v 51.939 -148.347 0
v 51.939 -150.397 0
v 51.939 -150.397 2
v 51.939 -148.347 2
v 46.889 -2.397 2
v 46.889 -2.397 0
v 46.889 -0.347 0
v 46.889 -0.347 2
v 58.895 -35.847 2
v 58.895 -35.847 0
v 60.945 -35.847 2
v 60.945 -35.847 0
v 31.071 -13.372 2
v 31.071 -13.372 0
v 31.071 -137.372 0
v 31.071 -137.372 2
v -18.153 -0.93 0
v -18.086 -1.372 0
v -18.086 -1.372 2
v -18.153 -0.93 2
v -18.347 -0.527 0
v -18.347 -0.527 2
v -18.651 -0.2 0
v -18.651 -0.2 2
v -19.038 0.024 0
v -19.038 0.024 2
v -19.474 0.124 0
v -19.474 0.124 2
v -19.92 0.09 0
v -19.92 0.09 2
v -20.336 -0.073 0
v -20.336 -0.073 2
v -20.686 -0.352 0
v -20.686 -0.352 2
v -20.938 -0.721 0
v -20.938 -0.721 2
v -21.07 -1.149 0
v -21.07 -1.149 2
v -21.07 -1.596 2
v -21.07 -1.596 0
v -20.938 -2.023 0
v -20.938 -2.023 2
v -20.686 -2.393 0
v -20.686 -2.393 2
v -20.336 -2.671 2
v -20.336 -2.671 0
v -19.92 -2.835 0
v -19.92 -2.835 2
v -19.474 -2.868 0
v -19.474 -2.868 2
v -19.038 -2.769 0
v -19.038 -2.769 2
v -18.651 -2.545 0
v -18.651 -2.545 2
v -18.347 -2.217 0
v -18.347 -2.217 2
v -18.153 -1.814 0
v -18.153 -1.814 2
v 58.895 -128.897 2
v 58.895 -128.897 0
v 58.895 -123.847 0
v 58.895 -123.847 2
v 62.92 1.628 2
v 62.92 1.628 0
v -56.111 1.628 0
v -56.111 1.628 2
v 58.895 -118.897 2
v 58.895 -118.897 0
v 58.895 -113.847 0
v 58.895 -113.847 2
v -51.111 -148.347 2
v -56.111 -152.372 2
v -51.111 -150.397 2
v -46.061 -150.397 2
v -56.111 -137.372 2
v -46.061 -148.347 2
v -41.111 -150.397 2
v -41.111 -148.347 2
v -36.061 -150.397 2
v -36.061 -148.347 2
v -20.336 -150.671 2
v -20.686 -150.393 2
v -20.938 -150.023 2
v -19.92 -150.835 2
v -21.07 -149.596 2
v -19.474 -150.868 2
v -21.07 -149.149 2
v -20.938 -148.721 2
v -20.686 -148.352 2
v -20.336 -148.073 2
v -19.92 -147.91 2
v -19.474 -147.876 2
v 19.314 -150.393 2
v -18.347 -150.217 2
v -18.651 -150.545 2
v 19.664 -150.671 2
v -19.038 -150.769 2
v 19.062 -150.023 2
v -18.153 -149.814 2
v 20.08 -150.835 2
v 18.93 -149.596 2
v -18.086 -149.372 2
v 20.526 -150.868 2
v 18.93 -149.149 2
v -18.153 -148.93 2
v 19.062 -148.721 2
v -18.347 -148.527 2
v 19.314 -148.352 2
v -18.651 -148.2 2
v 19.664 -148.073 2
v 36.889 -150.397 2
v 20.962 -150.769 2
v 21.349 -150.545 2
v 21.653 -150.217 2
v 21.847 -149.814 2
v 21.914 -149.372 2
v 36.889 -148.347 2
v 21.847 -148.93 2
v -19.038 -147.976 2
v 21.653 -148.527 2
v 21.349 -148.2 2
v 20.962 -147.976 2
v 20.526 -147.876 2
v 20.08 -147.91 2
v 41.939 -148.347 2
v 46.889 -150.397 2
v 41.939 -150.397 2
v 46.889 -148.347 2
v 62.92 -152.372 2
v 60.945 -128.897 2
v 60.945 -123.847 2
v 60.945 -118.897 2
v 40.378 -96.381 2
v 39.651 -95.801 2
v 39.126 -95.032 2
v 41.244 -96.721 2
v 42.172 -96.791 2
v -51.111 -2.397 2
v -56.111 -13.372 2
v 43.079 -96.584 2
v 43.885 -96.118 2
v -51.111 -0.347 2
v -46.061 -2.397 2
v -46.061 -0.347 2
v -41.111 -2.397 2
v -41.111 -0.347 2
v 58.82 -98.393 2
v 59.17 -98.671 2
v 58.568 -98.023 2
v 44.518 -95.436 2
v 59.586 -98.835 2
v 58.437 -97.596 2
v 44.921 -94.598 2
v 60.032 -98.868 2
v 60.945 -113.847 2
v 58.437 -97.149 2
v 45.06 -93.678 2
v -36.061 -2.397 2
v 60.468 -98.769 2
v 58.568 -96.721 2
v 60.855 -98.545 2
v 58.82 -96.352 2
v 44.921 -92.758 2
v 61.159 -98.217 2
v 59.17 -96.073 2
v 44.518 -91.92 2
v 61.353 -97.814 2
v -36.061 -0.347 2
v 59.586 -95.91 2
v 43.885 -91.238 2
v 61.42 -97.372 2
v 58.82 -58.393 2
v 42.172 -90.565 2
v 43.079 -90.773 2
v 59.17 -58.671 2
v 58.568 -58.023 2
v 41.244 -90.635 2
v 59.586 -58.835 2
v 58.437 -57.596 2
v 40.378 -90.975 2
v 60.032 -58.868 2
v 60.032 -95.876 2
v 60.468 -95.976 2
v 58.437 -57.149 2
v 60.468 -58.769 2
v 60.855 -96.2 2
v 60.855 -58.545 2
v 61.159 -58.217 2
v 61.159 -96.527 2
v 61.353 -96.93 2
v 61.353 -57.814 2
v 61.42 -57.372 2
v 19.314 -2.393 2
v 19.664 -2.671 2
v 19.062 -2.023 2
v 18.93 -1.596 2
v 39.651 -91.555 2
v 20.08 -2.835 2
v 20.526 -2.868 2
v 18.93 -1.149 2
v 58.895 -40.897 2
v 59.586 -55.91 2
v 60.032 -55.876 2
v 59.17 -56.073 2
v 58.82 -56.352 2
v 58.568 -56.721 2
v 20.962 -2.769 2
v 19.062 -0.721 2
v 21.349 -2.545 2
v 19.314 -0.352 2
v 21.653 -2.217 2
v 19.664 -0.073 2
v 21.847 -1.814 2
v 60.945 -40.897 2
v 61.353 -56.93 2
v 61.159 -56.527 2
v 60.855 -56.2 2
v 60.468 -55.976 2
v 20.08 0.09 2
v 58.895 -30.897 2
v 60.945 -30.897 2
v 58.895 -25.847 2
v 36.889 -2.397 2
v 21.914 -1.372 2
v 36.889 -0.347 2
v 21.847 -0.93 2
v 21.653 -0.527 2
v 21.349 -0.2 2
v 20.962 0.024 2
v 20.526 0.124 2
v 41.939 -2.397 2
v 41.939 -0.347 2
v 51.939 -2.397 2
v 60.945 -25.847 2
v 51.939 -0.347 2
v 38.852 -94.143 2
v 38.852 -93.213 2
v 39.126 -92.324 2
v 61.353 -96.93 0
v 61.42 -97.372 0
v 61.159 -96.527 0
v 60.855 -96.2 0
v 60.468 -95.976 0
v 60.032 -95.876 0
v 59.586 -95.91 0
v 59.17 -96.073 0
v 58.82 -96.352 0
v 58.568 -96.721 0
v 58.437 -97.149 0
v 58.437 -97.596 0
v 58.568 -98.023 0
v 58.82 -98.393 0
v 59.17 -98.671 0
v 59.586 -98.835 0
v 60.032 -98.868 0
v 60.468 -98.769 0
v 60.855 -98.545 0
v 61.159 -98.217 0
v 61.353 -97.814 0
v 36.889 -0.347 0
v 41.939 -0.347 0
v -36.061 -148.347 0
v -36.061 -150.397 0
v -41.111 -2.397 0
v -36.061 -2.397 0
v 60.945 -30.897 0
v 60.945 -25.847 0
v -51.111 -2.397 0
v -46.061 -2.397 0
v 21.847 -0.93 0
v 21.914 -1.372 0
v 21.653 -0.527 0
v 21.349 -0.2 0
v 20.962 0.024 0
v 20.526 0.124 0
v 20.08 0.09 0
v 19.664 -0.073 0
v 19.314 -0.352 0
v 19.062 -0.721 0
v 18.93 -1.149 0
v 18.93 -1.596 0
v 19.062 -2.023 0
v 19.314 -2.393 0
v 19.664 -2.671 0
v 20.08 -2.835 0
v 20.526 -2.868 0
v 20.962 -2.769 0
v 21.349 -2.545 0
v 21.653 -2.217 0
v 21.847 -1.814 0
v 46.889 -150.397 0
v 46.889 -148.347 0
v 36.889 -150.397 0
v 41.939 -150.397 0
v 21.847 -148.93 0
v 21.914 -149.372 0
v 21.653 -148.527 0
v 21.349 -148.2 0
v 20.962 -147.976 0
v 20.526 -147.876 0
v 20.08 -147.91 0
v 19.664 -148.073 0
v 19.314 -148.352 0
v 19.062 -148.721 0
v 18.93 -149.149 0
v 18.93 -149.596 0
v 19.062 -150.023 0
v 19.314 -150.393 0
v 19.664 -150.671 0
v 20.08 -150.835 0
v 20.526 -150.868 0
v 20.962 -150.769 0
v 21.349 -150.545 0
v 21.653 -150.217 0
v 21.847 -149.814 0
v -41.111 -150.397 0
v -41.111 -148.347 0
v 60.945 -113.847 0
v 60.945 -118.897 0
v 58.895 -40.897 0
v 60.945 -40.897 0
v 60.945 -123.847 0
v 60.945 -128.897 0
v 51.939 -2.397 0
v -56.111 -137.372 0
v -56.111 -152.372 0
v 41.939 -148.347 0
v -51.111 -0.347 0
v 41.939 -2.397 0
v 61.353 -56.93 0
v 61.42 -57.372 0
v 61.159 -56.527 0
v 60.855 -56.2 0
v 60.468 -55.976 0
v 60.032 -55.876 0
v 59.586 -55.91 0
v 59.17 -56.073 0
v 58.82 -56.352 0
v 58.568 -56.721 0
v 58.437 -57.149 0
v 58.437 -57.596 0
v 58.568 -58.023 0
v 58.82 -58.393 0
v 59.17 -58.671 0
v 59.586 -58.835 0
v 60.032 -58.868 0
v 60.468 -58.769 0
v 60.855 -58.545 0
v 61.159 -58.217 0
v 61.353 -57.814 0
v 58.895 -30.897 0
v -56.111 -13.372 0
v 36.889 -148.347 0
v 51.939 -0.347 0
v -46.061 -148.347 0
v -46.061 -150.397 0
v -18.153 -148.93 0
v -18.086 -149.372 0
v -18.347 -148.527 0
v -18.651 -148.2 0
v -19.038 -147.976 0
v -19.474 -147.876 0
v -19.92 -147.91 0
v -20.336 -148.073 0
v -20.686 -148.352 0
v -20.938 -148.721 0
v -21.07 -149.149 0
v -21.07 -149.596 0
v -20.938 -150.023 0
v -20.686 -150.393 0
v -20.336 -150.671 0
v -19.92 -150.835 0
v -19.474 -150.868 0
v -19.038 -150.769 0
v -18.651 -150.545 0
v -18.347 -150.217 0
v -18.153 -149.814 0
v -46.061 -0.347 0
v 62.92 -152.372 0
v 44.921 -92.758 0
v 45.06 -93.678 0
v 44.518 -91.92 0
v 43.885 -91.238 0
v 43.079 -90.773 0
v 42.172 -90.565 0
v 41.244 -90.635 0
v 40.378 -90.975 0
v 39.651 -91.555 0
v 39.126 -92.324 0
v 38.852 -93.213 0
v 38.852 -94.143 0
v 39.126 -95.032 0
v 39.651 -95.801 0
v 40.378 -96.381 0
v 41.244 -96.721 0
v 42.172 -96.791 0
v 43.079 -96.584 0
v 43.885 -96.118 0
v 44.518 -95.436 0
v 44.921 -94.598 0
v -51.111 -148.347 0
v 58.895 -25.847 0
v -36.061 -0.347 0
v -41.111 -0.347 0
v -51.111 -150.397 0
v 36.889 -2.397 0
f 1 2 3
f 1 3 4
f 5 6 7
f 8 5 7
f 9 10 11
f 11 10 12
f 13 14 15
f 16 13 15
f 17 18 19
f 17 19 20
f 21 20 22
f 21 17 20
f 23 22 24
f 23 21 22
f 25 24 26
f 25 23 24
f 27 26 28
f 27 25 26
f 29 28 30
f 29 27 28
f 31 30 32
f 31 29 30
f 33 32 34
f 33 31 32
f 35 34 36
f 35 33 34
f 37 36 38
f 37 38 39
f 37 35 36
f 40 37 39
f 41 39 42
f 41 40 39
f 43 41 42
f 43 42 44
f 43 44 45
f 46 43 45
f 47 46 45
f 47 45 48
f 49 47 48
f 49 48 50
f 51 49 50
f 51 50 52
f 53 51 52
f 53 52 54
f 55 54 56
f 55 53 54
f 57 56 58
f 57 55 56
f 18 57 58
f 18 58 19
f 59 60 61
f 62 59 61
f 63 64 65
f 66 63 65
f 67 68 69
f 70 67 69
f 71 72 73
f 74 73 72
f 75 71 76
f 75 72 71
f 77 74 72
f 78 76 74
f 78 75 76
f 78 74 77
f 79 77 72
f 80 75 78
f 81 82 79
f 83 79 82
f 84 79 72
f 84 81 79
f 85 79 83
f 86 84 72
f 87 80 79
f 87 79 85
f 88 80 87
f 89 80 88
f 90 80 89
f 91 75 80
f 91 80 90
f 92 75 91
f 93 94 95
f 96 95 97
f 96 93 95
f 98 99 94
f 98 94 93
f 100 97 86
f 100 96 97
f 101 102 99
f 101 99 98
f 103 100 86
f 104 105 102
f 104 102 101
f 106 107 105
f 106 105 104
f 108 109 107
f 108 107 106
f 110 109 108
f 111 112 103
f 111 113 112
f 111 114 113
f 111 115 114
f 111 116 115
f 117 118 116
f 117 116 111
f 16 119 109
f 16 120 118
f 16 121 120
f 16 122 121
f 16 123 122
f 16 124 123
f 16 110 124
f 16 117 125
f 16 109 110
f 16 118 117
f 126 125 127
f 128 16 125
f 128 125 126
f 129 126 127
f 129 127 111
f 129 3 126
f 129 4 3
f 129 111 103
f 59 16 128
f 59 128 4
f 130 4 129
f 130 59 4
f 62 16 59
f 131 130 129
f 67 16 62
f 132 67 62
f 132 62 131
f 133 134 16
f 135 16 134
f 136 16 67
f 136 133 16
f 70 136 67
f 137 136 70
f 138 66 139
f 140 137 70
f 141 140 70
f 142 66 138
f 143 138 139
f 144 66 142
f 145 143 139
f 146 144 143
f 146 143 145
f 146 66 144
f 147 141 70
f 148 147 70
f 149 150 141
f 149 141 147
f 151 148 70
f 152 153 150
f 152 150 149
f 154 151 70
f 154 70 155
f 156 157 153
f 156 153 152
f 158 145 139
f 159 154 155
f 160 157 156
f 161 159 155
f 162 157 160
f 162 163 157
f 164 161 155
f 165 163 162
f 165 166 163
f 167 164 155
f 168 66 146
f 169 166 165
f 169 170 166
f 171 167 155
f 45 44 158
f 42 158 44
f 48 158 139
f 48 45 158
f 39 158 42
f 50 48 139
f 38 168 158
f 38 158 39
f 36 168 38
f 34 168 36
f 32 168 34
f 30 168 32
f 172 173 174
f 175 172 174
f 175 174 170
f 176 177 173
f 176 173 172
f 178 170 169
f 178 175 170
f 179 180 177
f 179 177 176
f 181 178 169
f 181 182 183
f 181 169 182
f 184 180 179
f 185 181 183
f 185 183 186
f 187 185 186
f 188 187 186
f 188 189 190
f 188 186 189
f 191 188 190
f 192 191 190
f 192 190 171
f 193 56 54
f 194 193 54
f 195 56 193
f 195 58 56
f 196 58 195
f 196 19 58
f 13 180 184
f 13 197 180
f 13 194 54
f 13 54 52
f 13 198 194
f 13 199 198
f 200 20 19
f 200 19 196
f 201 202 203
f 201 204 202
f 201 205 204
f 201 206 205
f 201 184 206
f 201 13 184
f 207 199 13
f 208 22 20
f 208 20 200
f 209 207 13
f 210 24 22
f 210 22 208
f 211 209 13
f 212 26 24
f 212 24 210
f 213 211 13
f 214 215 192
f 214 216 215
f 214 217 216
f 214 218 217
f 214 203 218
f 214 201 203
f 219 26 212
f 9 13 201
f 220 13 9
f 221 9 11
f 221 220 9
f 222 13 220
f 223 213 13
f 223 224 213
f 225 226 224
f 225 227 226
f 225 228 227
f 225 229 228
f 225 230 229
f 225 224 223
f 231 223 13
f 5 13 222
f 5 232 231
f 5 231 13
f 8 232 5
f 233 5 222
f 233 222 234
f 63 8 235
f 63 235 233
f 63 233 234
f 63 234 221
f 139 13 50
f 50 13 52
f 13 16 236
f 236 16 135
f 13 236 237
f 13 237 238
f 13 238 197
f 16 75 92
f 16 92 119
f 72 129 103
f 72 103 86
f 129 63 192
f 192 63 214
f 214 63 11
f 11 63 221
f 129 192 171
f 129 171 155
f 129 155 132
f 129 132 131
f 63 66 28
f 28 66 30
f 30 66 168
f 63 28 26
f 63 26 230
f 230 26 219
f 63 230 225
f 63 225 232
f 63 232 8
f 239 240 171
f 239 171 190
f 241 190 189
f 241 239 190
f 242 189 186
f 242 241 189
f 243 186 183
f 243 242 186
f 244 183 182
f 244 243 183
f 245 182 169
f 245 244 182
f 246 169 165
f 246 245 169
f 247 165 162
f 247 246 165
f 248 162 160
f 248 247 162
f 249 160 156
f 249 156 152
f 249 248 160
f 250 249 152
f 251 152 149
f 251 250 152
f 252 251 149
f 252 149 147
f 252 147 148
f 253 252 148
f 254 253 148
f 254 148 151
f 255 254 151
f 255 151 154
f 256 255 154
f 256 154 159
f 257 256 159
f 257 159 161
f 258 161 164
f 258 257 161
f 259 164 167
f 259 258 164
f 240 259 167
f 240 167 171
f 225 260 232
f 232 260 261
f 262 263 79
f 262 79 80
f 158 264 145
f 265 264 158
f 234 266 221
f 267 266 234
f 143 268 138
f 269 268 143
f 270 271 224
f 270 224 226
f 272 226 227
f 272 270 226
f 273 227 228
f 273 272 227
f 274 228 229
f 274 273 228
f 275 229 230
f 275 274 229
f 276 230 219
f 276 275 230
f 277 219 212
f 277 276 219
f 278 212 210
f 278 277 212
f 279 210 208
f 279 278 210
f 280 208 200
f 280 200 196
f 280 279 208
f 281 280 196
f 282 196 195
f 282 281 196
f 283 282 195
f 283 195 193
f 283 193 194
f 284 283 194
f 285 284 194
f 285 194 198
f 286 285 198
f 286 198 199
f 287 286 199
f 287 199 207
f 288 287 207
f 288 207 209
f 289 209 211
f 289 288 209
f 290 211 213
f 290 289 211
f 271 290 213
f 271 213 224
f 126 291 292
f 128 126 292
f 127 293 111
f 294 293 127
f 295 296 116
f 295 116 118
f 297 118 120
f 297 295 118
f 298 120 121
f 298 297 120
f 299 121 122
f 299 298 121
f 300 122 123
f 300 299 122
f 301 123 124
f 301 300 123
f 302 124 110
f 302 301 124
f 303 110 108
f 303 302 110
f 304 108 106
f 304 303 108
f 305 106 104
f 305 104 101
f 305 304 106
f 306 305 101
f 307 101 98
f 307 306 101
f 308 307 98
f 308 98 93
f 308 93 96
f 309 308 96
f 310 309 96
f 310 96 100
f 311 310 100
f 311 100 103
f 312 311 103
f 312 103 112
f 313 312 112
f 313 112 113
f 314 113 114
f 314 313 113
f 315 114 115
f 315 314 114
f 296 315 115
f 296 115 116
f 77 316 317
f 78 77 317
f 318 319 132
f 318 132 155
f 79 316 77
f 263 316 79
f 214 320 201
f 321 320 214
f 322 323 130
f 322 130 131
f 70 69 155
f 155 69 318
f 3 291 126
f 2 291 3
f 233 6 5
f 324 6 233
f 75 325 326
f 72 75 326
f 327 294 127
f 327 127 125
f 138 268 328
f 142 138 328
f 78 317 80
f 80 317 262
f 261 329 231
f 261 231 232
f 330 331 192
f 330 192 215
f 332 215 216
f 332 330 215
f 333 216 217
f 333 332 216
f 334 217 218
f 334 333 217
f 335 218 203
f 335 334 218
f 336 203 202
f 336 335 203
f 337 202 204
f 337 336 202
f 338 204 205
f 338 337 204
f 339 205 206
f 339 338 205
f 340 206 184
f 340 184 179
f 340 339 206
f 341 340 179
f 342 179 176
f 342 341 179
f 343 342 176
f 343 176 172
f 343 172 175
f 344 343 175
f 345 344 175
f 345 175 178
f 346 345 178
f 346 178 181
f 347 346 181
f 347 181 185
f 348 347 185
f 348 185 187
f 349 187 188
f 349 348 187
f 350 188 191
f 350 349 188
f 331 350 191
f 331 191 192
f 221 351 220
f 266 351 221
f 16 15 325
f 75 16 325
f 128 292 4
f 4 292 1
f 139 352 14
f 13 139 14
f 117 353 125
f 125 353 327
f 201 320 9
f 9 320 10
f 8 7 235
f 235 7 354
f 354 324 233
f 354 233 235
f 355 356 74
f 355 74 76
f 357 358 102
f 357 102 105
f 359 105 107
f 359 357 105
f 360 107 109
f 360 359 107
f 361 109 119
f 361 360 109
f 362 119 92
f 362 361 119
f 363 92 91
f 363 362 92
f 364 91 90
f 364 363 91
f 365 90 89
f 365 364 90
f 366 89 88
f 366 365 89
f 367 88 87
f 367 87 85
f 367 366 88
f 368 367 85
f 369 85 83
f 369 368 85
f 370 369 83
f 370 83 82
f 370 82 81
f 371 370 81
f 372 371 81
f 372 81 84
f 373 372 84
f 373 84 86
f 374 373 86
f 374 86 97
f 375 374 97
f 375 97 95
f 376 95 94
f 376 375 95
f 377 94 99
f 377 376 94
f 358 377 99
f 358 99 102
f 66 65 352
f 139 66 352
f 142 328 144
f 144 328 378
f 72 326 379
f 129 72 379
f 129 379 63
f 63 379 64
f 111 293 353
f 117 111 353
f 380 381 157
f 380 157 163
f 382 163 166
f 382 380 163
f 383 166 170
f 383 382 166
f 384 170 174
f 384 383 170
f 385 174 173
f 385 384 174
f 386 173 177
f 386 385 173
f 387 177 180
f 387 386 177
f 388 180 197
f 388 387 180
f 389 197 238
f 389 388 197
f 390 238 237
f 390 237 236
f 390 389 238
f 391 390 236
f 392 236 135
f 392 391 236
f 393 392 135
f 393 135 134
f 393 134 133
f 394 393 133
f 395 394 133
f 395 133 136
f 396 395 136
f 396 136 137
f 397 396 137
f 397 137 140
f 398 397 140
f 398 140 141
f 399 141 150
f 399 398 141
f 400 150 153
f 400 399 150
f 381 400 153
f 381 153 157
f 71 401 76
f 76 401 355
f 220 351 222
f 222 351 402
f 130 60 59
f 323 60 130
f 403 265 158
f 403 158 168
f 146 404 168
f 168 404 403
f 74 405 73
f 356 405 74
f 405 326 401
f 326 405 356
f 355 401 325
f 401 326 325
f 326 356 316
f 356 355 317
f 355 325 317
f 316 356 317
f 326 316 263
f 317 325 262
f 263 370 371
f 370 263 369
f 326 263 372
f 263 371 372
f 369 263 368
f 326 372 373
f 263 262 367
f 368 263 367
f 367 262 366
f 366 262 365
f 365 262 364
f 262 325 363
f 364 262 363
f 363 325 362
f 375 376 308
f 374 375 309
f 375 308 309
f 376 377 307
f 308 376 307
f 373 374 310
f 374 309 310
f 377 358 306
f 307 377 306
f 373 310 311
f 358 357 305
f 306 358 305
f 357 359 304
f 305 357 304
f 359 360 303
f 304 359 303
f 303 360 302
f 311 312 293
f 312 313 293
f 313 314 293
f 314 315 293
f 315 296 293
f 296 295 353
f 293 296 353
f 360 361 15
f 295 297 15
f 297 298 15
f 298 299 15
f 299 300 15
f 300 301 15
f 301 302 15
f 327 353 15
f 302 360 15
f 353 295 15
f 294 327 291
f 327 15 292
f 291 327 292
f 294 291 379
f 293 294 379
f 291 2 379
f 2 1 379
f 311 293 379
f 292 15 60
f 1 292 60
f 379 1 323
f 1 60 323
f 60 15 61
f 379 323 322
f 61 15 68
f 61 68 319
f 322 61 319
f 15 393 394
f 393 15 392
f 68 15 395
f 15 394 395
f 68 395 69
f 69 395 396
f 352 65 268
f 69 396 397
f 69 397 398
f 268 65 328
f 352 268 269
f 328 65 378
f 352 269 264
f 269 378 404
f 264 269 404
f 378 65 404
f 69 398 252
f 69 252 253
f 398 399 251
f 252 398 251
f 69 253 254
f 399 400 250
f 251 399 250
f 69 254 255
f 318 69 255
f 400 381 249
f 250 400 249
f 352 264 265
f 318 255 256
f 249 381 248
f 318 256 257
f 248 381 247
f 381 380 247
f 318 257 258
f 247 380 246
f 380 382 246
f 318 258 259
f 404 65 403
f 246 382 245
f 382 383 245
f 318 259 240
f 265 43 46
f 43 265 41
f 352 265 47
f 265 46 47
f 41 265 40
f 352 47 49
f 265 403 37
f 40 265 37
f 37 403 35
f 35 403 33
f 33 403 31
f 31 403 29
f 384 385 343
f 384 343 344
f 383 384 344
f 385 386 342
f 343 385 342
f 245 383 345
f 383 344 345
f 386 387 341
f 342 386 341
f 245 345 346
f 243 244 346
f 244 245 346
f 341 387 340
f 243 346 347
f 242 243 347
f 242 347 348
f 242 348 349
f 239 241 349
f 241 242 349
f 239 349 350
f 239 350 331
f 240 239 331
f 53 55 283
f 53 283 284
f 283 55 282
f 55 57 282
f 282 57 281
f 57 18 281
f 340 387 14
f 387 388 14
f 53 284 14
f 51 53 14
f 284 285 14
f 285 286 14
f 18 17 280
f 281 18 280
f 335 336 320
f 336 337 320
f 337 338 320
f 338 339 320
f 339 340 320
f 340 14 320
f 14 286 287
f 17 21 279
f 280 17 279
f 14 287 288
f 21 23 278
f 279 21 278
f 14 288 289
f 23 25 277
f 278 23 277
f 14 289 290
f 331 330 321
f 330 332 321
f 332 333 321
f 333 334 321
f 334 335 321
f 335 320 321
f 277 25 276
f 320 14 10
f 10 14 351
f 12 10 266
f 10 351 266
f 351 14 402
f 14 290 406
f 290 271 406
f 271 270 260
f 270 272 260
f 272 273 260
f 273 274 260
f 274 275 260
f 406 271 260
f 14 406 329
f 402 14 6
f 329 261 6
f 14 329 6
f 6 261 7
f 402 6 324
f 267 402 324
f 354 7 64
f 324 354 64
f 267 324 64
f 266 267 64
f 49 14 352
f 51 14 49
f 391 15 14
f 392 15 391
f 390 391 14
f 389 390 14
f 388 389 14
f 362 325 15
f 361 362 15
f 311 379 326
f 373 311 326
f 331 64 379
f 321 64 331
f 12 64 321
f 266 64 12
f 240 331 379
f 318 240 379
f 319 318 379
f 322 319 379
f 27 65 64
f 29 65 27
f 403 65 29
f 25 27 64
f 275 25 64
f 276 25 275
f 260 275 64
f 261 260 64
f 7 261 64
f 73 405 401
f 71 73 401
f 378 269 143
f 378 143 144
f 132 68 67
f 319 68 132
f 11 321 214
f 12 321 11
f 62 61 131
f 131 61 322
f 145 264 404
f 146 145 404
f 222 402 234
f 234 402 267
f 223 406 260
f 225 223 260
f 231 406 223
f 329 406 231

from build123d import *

# Parameters (mm, degrees)
SKETCH_1_R      = 1.5
SKETCH_1_R_2    = 3.121318996
SKETCH_1_W      = 5.05
SKETCH_1_H      = 2.05
SKETCH_1_W_2    = 2.05
SKETCH_1_H_2    = 5.05
EXTRUDE_1_DEPTH = 2


with BuildPart() as part:
    # 草图1 → 凸台-拉伸1 (new body)
    with BuildSketch(Plane.XY):
        Polygon((-56.111334712, -13.372248853), (31.071025228, -13.372248853), (31.071025228, -137.372248853), (-56.111334712, -137.372248853), (-56.111334712, -152.372248853), (62.919821756, -152.372248853), (62.919821756, 1.627751147), (-56.111334712, 1.627751147), align=None)
        with Locations((-19.586334712, -1.372248853)):
            Circle(SKETCH_1_R, mode=Mode.SUBTRACT)
        with Locations((20.413665288, -1.372248853)):
            Circle(SKETCH_1_R, mode=Mode.SUBTRACT)
        with Locations((-19.586334712, -149.372248853)):
            Circle(SKETCH_1_R, mode=Mode.SUBTRACT)
        with Locations((20.413665288, -149.372248853)):
            Circle(SKETCH_1_R, mode=Mode.SUBTRACT)
        with Locations((59.919821756, -97.372248853)):
            Circle(SKETCH_1_R, mode=Mode.SUBTRACT)
        with Locations((59.919821756, -57.372248853)):
            Circle(SKETCH_1_R, mode=Mode.SUBTRACT)
        with Locations((41.938665288, -93.678088908)):
            Circle(SKETCH_1_R_2, mode=Mode.SUBTRACT)
        with Locations((39.413665288, -1.372248853)):
            Rectangle(SKETCH_1_W, SKETCH_1_H, mode=Mode.SUBTRACT)
        with Locations((49.413665288, -1.372248853)):
            Rectangle(SKETCH_1_W, SKETCH_1_H, mode=Mode.SUBTRACT)
        with Locations((-48.586334712, -1.372248853)):
            Rectangle(SKETCH_1_W, SKETCH_1_H, mode=Mode.SUBTRACT)
        with Locations((-38.586334712, -1.372248853)):
            Rectangle(SKETCH_1_W, SKETCH_1_H, mode=Mode.SUBTRACT)
        with Locations((39.413665288, -149.372248853)):
            Rectangle(SKETCH_1_W, SKETCH_1_H, mode=Mode.SUBTRACT)
        with Locations((49.413665288, -149.372248853)):
            Rectangle(SKETCH_1_W, SKETCH_1_H, mode=Mode.SUBTRACT)
        with Locations((-48.586334712, -149.372248853)):
            Rectangle(SKETCH_1_W, SKETCH_1_H, mode=Mode.SUBTRACT)
        with Locations((-38.586334712, -149.372248853)):
            Rectangle(SKETCH_1_W, SKETCH_1_H, mode=Mode.SUBTRACT)
        with Locations((59.919821756, -38.372248853)):
            Rectangle(SKETCH_1_W_2, SKETCH_1_H_2, mode=Mode.SUBTRACT)
        with Locations((59.919821756, -28.372248853)):
            Rectangle(SKETCH_1_W_2, SKETCH_1_H_2, mode=Mode.SUBTRACT)
        with Locations((59.919821756, -126.372248853)):
            Rectangle(SKETCH_1_W_2, SKETCH_1_H_2, mode=Mode.SUBTRACT)
        with Locations((59.919821756, -116.372248853)):
            Rectangle(SKETCH_1_W_2, SKETCH_1_H_2, mode=Mode.SUBTRACT)
    extrude(amount=EXTRUDE_1_DEPTH)


solid = part.part
